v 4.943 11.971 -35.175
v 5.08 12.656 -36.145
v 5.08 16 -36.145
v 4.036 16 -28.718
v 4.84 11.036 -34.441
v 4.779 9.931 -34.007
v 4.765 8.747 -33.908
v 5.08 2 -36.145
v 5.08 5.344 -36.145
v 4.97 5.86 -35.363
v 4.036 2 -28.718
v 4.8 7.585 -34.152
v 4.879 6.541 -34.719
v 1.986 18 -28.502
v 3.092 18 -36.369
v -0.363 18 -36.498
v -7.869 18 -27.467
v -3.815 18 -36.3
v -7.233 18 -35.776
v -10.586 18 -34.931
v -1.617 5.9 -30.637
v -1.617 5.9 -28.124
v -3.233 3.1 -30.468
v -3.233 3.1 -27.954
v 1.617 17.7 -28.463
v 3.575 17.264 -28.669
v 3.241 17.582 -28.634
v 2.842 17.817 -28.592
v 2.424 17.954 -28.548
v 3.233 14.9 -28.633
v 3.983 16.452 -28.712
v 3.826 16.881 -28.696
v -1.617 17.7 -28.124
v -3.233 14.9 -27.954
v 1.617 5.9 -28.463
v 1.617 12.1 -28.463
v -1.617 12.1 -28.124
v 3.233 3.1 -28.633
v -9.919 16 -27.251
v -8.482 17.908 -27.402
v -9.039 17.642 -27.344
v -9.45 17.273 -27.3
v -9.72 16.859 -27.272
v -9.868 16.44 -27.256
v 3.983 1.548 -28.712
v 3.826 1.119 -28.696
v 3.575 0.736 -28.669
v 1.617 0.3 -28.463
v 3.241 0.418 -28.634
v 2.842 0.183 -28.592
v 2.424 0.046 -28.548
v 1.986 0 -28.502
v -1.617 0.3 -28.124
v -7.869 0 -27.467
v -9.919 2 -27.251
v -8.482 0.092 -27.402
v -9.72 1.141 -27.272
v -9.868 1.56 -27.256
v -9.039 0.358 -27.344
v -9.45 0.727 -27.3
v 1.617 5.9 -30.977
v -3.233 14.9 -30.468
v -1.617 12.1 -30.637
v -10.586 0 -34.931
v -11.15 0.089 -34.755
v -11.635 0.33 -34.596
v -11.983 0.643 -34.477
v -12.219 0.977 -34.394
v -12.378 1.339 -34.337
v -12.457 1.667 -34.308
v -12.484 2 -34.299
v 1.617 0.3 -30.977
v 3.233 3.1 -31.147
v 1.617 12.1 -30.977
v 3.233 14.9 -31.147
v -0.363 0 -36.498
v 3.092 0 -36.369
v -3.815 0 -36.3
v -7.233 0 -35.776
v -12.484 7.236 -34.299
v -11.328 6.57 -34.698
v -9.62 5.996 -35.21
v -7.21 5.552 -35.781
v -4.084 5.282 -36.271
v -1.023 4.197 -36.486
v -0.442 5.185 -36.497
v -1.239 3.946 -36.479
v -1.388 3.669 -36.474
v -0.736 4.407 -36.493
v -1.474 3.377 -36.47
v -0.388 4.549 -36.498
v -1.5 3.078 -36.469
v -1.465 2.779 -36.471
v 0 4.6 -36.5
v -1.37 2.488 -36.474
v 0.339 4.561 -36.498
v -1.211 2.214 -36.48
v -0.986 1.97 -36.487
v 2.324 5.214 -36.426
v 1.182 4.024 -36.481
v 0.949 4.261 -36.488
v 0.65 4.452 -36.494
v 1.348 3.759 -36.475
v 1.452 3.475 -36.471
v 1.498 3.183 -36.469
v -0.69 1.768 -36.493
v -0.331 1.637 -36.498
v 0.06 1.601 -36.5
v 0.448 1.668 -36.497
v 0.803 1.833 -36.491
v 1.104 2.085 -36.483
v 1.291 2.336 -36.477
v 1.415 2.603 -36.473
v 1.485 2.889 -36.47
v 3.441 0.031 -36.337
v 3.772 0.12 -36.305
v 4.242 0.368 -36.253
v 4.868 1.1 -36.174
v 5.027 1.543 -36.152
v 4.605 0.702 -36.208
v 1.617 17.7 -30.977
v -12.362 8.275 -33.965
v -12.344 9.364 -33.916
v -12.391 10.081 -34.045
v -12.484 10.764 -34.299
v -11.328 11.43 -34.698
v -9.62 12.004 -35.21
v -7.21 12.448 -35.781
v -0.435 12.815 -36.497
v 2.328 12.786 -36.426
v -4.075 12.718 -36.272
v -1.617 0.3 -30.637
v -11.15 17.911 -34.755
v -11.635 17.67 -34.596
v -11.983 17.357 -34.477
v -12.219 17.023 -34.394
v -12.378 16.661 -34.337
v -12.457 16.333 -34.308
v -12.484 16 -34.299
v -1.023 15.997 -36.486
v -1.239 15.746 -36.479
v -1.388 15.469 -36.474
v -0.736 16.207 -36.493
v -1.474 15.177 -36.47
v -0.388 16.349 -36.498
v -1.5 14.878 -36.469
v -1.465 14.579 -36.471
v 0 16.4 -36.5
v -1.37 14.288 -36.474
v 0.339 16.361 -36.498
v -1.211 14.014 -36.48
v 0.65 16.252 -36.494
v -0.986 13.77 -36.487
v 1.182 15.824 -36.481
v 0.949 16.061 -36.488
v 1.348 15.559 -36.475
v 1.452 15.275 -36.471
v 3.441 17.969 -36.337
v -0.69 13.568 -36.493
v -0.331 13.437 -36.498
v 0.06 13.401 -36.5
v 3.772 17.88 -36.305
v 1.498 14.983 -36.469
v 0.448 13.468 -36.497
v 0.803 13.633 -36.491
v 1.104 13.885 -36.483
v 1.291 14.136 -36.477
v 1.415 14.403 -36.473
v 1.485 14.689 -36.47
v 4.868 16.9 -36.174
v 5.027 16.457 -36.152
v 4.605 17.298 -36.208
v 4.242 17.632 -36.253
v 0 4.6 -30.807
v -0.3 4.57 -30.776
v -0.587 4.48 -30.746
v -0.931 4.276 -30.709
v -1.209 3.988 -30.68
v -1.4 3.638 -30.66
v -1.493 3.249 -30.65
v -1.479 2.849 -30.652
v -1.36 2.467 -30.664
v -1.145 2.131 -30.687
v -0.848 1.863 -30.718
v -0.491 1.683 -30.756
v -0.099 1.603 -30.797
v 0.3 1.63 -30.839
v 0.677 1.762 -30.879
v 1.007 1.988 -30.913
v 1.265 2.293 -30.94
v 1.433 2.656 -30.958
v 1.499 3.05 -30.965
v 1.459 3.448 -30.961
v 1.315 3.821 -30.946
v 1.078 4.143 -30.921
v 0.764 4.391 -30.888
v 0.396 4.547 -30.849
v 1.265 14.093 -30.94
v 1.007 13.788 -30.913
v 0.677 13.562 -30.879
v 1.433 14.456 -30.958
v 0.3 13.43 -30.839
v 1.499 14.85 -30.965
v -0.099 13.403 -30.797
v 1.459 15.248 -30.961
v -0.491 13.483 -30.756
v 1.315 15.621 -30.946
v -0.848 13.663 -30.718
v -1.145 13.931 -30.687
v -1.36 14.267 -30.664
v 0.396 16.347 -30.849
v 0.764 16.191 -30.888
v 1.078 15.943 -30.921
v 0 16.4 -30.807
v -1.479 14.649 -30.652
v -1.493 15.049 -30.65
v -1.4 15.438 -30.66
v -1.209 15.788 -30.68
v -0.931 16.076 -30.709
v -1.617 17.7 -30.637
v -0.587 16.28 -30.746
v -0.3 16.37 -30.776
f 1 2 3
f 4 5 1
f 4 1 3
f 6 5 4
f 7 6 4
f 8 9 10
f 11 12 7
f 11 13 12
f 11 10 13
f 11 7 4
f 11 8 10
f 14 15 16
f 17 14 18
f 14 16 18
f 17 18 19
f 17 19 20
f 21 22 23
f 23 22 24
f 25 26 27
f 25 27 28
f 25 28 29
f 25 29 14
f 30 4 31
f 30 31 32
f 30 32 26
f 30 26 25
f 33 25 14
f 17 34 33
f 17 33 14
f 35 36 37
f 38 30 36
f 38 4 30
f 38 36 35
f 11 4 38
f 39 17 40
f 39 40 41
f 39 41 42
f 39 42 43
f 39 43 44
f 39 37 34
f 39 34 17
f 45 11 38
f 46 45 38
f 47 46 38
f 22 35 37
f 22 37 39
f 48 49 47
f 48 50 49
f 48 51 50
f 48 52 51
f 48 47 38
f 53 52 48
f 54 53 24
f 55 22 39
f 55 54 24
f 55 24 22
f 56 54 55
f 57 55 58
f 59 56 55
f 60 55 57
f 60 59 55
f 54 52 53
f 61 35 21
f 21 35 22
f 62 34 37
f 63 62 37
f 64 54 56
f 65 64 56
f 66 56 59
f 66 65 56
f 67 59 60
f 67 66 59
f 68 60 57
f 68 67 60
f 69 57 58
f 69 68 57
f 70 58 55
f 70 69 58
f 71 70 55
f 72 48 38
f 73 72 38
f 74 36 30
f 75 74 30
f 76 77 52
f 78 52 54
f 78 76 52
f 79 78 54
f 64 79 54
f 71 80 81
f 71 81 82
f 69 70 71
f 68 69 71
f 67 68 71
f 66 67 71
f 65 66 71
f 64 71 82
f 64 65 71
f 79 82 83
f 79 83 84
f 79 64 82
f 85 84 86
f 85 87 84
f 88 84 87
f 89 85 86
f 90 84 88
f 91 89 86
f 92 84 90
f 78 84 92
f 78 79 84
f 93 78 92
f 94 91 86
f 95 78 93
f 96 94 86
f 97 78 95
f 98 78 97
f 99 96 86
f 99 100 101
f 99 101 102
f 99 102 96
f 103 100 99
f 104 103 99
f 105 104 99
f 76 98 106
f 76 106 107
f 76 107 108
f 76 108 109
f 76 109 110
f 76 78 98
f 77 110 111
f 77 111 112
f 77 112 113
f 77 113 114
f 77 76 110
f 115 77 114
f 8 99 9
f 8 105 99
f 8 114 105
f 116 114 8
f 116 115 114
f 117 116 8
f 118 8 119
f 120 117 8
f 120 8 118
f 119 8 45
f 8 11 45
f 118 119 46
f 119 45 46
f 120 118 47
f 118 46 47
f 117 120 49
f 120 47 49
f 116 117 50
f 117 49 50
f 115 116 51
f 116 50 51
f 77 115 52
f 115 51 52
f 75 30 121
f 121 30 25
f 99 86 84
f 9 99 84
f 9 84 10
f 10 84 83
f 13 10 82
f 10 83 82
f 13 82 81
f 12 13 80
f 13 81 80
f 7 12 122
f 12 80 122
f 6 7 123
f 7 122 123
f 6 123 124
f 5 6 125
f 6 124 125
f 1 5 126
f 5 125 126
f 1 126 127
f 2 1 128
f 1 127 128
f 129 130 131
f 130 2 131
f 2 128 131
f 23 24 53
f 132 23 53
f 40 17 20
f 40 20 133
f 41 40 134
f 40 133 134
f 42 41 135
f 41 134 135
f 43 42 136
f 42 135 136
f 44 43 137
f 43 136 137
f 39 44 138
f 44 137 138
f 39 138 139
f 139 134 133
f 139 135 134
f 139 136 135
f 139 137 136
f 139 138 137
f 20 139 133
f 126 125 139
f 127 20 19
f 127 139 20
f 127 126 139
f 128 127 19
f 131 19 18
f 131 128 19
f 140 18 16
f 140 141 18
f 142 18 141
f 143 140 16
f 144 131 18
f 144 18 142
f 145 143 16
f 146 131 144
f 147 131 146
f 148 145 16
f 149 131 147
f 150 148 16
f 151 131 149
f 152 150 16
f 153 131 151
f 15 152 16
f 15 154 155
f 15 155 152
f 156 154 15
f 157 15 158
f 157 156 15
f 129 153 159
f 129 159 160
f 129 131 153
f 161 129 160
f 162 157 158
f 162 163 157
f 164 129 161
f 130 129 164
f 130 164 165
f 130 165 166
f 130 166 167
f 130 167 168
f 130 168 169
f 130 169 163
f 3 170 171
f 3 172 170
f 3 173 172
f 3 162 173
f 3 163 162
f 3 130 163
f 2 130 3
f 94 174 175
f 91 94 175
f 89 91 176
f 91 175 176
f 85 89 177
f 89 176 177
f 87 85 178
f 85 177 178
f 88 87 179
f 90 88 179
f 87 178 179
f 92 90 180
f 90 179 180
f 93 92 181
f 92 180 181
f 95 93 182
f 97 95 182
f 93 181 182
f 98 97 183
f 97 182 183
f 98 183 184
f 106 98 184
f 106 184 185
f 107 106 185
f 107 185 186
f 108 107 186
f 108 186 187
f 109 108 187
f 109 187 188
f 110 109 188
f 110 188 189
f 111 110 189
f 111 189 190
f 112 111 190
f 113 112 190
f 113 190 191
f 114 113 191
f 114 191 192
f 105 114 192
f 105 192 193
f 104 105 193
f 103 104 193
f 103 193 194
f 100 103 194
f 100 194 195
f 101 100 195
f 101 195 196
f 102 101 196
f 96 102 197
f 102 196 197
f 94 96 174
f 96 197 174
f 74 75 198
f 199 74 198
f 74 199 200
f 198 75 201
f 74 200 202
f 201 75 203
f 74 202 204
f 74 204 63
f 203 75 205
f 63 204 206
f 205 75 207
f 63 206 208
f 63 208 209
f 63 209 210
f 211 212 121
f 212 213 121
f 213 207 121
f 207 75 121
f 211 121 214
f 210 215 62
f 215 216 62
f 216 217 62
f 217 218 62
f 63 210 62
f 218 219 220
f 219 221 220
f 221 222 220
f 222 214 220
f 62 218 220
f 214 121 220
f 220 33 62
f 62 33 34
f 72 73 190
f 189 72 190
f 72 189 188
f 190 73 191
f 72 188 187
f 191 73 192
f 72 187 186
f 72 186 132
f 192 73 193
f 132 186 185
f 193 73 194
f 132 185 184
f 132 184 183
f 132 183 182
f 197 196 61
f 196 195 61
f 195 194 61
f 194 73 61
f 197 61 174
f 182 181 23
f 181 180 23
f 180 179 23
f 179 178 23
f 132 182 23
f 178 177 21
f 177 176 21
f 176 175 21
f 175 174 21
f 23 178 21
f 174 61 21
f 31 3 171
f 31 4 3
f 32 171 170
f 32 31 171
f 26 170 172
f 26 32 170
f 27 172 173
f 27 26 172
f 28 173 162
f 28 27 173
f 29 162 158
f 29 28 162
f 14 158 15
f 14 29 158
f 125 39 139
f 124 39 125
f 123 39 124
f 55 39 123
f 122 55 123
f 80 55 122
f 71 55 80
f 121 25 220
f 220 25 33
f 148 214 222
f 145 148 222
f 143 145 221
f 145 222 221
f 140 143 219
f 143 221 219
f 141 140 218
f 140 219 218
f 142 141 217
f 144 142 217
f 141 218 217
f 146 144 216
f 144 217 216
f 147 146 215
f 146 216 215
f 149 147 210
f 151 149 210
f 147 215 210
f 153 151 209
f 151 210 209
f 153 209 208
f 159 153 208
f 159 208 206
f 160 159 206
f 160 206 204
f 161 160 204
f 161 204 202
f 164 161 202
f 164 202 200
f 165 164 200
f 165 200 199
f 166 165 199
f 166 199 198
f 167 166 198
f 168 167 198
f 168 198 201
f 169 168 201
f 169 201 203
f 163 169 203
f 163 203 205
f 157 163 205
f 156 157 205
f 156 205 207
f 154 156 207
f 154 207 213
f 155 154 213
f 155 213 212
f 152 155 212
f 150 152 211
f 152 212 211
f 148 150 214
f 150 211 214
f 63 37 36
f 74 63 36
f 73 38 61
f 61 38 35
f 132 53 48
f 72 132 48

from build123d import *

# Parameters (mm, degrees)
BOSS_EXTRUDE1_DEPTH     = 18
CUT_EXTRUDE1_DEPTH      = 44.04814257
CUT_EXTRUDE1_DEPTH_BACK = 44.04814257
SKETCH5_R               = 1.5
CUT_EXTRUDE2_DEPTH      = 44.048142727
CUT_EXTRUDE3_START      = -18
CUT_EXTRUDE3_DEPTH      = 18
FILLET1_R               = 2
CUT_EXTRUDE5_REACH      = 44.569


# Read off the part's stored shape, not the designer's step: Cut-Extrude3
with BuildPart() as part:
    # Sketch2 → Boss-Extrude1 (new body)
    with BuildSketch(Plane(origin=(0, 0, 0), x_dir=(1, 0, 0), z_dir=(0, 1, 0))):
        with BuildLine():
            Line((5.149404736, 36.639918543), (4.036019928, 28.717773994))
            Line((4.036019928, 28.717773994), (-9.918584156, 27.251086003))
            Line((-9.918584156, 27.251086003), (-12.654745303, 34.768626969))
            ThreePointArc((-12.654745303, 34.768626969), (-3.867553141, 36.797310129), (5.149404736, 36.639918543))
        make_face()
    extrude(amount=BOSS_EXTRUDE1_DEPTH)

    # Sketch3 → Cut-Extrude1 (cut, two sides: drawn at the far end of the back side and taken through both)
    with BuildSketch(Plane(origin=(0, 0, 0), x_dir=(0, 0, -1), z_dir=(1, 0, 0)).offset(-CUT_EXTRUDE1_DEPTH_BACK)):
        with BuildLine():
            Line((38, 13.1), (41.639918543, 13.1))
            Line((41.639918543, 13.1), (41.639918543, 4.9))
            Line((41.639918543, 4.9), (38, 4.9))
            ThreePointArc((38, 4.9), (33.9, 9), (38, 13.1))
        make_face()
    extrude(amount=CUT_EXTRUDE1_DEPTH + CUT_EXTRUDE1_DEPTH_BACK, mode=Mode.SUBTRACT)

    # Sketch5 → Cut-Extrude2 (cut, through all)
    with BuildSketch(Plane.XY):
        with Locations(Location((0, 3.1, 0), (0, 0, 90))):
            Circle(SKETCH5_R)
        with Locations(Location((0, 14.9, 0), (0, 0, 90))):
            Circle(SKETCH5_R)
    extrude(amount=-CUT_EXTRUDE2_DEPTH, mode=Mode.SUBTRACT)

    # Cut-Extrude3 outline → Cut-Extrude3 (cut)
    with BuildSketch(Plane(origin=(0, 18, 0), x_dir=(1, 0, 0), z_dir=(0, 1, 0)).offset(CUT_EXTRUDE3_START)):
        with BuildLine():
            ThreePointArc((-12.483737701, 34.29877976), (-3.815290216, 36.300049044), (5.079818185, 36.144784509))
            Line((5.079818185, 36.144784509), (5.149404736, 36.639918543))
            ThreePointArc((5.149404736, 36.639918543), (-3.867553141, 36.797310129), (-12.654745303, 34.768626969))
            Line((-12.654745303, 34.768626969), (-12.483737701, 34.29877976))
        make_face()
    extrude(amount=CUT_EXTRUDE3_DEPTH, mode=Mode.SUBTRACT)

    # Fillet1
    fillet1_edges = [part.edges().sort_by_distance(p)[0] for p in [
        (4.557919056, 18, -32.431279251),
        (4.557919056, 0, -32.431279251),
        (-11.201159694, 0, -30.774933331),
        (-11.201159694, 18, -30.774933331),
    ]]
    fillet(fillet1_edges, radius=FILLET1_R)

    # Cut-Extrude5: up to this plane
    cut_extrude5_end = Plane(origin=(-10.179905315, 18, -29.737390741), z_dir=(-0.10452846326765396, 0, -0.9945218953682733))
    # Sketch7 → Cut-Extrude5 (cut, up to the surface)
    with BuildSketch(Plane.XY, mode=Mode.PRIVATE) as cut_extrude5_sk1:
        Polygon((3.233161507, 14.9), (1.616580754, 17.7), (-1.616580754, 17.7), (-3.233161507, 14.9), (-1.616580754, 12.1), (1.616580754, 12.1), align=None)
    cut_extrude5_tool1 = split(extrude(cut_extrude5_sk1.sketch, amount=-CUT_EXTRUDE5_REACH, mode=Mode.PRIVATE), bisect_by=cut_extrude5_end, keep=Keep.BOTH, mode=Mode.PRIVATE)
    add(cut_extrude5_tool1.solids().sort_by_distance((0, 14.9, 0))[0], mode=Mode.SUBTRACT)
    # Sketch7 → Cut-Extrude5 (cut, up to the surface)
    with BuildSketch(Plane.XY, mode=Mode.PRIVATE) as cut_extrude5_sk2:
        Polygon((-3.233161507, 3.1), (-1.616580754, 0.3), (1.616580754, 0.3), (3.233161507, 3.1), (1.616580754, 5.9), (-1.616580754, 5.9), align=None)
    cut_extrude5_tool2 = split(extrude(cut_extrude5_sk2.sketch, amount=-CUT_EXTRUDE5_REACH, mode=Mode.PRIVATE), bisect_by=cut_extrude5_end, keep=Keep.BOTH, mode=Mode.PRIVATE)
    add(cut_extrude5_tool2.solids().sort_by_distance((0, 3.1, 0))[0], mode=Mode.SUBTRACT)


solid = part.part
